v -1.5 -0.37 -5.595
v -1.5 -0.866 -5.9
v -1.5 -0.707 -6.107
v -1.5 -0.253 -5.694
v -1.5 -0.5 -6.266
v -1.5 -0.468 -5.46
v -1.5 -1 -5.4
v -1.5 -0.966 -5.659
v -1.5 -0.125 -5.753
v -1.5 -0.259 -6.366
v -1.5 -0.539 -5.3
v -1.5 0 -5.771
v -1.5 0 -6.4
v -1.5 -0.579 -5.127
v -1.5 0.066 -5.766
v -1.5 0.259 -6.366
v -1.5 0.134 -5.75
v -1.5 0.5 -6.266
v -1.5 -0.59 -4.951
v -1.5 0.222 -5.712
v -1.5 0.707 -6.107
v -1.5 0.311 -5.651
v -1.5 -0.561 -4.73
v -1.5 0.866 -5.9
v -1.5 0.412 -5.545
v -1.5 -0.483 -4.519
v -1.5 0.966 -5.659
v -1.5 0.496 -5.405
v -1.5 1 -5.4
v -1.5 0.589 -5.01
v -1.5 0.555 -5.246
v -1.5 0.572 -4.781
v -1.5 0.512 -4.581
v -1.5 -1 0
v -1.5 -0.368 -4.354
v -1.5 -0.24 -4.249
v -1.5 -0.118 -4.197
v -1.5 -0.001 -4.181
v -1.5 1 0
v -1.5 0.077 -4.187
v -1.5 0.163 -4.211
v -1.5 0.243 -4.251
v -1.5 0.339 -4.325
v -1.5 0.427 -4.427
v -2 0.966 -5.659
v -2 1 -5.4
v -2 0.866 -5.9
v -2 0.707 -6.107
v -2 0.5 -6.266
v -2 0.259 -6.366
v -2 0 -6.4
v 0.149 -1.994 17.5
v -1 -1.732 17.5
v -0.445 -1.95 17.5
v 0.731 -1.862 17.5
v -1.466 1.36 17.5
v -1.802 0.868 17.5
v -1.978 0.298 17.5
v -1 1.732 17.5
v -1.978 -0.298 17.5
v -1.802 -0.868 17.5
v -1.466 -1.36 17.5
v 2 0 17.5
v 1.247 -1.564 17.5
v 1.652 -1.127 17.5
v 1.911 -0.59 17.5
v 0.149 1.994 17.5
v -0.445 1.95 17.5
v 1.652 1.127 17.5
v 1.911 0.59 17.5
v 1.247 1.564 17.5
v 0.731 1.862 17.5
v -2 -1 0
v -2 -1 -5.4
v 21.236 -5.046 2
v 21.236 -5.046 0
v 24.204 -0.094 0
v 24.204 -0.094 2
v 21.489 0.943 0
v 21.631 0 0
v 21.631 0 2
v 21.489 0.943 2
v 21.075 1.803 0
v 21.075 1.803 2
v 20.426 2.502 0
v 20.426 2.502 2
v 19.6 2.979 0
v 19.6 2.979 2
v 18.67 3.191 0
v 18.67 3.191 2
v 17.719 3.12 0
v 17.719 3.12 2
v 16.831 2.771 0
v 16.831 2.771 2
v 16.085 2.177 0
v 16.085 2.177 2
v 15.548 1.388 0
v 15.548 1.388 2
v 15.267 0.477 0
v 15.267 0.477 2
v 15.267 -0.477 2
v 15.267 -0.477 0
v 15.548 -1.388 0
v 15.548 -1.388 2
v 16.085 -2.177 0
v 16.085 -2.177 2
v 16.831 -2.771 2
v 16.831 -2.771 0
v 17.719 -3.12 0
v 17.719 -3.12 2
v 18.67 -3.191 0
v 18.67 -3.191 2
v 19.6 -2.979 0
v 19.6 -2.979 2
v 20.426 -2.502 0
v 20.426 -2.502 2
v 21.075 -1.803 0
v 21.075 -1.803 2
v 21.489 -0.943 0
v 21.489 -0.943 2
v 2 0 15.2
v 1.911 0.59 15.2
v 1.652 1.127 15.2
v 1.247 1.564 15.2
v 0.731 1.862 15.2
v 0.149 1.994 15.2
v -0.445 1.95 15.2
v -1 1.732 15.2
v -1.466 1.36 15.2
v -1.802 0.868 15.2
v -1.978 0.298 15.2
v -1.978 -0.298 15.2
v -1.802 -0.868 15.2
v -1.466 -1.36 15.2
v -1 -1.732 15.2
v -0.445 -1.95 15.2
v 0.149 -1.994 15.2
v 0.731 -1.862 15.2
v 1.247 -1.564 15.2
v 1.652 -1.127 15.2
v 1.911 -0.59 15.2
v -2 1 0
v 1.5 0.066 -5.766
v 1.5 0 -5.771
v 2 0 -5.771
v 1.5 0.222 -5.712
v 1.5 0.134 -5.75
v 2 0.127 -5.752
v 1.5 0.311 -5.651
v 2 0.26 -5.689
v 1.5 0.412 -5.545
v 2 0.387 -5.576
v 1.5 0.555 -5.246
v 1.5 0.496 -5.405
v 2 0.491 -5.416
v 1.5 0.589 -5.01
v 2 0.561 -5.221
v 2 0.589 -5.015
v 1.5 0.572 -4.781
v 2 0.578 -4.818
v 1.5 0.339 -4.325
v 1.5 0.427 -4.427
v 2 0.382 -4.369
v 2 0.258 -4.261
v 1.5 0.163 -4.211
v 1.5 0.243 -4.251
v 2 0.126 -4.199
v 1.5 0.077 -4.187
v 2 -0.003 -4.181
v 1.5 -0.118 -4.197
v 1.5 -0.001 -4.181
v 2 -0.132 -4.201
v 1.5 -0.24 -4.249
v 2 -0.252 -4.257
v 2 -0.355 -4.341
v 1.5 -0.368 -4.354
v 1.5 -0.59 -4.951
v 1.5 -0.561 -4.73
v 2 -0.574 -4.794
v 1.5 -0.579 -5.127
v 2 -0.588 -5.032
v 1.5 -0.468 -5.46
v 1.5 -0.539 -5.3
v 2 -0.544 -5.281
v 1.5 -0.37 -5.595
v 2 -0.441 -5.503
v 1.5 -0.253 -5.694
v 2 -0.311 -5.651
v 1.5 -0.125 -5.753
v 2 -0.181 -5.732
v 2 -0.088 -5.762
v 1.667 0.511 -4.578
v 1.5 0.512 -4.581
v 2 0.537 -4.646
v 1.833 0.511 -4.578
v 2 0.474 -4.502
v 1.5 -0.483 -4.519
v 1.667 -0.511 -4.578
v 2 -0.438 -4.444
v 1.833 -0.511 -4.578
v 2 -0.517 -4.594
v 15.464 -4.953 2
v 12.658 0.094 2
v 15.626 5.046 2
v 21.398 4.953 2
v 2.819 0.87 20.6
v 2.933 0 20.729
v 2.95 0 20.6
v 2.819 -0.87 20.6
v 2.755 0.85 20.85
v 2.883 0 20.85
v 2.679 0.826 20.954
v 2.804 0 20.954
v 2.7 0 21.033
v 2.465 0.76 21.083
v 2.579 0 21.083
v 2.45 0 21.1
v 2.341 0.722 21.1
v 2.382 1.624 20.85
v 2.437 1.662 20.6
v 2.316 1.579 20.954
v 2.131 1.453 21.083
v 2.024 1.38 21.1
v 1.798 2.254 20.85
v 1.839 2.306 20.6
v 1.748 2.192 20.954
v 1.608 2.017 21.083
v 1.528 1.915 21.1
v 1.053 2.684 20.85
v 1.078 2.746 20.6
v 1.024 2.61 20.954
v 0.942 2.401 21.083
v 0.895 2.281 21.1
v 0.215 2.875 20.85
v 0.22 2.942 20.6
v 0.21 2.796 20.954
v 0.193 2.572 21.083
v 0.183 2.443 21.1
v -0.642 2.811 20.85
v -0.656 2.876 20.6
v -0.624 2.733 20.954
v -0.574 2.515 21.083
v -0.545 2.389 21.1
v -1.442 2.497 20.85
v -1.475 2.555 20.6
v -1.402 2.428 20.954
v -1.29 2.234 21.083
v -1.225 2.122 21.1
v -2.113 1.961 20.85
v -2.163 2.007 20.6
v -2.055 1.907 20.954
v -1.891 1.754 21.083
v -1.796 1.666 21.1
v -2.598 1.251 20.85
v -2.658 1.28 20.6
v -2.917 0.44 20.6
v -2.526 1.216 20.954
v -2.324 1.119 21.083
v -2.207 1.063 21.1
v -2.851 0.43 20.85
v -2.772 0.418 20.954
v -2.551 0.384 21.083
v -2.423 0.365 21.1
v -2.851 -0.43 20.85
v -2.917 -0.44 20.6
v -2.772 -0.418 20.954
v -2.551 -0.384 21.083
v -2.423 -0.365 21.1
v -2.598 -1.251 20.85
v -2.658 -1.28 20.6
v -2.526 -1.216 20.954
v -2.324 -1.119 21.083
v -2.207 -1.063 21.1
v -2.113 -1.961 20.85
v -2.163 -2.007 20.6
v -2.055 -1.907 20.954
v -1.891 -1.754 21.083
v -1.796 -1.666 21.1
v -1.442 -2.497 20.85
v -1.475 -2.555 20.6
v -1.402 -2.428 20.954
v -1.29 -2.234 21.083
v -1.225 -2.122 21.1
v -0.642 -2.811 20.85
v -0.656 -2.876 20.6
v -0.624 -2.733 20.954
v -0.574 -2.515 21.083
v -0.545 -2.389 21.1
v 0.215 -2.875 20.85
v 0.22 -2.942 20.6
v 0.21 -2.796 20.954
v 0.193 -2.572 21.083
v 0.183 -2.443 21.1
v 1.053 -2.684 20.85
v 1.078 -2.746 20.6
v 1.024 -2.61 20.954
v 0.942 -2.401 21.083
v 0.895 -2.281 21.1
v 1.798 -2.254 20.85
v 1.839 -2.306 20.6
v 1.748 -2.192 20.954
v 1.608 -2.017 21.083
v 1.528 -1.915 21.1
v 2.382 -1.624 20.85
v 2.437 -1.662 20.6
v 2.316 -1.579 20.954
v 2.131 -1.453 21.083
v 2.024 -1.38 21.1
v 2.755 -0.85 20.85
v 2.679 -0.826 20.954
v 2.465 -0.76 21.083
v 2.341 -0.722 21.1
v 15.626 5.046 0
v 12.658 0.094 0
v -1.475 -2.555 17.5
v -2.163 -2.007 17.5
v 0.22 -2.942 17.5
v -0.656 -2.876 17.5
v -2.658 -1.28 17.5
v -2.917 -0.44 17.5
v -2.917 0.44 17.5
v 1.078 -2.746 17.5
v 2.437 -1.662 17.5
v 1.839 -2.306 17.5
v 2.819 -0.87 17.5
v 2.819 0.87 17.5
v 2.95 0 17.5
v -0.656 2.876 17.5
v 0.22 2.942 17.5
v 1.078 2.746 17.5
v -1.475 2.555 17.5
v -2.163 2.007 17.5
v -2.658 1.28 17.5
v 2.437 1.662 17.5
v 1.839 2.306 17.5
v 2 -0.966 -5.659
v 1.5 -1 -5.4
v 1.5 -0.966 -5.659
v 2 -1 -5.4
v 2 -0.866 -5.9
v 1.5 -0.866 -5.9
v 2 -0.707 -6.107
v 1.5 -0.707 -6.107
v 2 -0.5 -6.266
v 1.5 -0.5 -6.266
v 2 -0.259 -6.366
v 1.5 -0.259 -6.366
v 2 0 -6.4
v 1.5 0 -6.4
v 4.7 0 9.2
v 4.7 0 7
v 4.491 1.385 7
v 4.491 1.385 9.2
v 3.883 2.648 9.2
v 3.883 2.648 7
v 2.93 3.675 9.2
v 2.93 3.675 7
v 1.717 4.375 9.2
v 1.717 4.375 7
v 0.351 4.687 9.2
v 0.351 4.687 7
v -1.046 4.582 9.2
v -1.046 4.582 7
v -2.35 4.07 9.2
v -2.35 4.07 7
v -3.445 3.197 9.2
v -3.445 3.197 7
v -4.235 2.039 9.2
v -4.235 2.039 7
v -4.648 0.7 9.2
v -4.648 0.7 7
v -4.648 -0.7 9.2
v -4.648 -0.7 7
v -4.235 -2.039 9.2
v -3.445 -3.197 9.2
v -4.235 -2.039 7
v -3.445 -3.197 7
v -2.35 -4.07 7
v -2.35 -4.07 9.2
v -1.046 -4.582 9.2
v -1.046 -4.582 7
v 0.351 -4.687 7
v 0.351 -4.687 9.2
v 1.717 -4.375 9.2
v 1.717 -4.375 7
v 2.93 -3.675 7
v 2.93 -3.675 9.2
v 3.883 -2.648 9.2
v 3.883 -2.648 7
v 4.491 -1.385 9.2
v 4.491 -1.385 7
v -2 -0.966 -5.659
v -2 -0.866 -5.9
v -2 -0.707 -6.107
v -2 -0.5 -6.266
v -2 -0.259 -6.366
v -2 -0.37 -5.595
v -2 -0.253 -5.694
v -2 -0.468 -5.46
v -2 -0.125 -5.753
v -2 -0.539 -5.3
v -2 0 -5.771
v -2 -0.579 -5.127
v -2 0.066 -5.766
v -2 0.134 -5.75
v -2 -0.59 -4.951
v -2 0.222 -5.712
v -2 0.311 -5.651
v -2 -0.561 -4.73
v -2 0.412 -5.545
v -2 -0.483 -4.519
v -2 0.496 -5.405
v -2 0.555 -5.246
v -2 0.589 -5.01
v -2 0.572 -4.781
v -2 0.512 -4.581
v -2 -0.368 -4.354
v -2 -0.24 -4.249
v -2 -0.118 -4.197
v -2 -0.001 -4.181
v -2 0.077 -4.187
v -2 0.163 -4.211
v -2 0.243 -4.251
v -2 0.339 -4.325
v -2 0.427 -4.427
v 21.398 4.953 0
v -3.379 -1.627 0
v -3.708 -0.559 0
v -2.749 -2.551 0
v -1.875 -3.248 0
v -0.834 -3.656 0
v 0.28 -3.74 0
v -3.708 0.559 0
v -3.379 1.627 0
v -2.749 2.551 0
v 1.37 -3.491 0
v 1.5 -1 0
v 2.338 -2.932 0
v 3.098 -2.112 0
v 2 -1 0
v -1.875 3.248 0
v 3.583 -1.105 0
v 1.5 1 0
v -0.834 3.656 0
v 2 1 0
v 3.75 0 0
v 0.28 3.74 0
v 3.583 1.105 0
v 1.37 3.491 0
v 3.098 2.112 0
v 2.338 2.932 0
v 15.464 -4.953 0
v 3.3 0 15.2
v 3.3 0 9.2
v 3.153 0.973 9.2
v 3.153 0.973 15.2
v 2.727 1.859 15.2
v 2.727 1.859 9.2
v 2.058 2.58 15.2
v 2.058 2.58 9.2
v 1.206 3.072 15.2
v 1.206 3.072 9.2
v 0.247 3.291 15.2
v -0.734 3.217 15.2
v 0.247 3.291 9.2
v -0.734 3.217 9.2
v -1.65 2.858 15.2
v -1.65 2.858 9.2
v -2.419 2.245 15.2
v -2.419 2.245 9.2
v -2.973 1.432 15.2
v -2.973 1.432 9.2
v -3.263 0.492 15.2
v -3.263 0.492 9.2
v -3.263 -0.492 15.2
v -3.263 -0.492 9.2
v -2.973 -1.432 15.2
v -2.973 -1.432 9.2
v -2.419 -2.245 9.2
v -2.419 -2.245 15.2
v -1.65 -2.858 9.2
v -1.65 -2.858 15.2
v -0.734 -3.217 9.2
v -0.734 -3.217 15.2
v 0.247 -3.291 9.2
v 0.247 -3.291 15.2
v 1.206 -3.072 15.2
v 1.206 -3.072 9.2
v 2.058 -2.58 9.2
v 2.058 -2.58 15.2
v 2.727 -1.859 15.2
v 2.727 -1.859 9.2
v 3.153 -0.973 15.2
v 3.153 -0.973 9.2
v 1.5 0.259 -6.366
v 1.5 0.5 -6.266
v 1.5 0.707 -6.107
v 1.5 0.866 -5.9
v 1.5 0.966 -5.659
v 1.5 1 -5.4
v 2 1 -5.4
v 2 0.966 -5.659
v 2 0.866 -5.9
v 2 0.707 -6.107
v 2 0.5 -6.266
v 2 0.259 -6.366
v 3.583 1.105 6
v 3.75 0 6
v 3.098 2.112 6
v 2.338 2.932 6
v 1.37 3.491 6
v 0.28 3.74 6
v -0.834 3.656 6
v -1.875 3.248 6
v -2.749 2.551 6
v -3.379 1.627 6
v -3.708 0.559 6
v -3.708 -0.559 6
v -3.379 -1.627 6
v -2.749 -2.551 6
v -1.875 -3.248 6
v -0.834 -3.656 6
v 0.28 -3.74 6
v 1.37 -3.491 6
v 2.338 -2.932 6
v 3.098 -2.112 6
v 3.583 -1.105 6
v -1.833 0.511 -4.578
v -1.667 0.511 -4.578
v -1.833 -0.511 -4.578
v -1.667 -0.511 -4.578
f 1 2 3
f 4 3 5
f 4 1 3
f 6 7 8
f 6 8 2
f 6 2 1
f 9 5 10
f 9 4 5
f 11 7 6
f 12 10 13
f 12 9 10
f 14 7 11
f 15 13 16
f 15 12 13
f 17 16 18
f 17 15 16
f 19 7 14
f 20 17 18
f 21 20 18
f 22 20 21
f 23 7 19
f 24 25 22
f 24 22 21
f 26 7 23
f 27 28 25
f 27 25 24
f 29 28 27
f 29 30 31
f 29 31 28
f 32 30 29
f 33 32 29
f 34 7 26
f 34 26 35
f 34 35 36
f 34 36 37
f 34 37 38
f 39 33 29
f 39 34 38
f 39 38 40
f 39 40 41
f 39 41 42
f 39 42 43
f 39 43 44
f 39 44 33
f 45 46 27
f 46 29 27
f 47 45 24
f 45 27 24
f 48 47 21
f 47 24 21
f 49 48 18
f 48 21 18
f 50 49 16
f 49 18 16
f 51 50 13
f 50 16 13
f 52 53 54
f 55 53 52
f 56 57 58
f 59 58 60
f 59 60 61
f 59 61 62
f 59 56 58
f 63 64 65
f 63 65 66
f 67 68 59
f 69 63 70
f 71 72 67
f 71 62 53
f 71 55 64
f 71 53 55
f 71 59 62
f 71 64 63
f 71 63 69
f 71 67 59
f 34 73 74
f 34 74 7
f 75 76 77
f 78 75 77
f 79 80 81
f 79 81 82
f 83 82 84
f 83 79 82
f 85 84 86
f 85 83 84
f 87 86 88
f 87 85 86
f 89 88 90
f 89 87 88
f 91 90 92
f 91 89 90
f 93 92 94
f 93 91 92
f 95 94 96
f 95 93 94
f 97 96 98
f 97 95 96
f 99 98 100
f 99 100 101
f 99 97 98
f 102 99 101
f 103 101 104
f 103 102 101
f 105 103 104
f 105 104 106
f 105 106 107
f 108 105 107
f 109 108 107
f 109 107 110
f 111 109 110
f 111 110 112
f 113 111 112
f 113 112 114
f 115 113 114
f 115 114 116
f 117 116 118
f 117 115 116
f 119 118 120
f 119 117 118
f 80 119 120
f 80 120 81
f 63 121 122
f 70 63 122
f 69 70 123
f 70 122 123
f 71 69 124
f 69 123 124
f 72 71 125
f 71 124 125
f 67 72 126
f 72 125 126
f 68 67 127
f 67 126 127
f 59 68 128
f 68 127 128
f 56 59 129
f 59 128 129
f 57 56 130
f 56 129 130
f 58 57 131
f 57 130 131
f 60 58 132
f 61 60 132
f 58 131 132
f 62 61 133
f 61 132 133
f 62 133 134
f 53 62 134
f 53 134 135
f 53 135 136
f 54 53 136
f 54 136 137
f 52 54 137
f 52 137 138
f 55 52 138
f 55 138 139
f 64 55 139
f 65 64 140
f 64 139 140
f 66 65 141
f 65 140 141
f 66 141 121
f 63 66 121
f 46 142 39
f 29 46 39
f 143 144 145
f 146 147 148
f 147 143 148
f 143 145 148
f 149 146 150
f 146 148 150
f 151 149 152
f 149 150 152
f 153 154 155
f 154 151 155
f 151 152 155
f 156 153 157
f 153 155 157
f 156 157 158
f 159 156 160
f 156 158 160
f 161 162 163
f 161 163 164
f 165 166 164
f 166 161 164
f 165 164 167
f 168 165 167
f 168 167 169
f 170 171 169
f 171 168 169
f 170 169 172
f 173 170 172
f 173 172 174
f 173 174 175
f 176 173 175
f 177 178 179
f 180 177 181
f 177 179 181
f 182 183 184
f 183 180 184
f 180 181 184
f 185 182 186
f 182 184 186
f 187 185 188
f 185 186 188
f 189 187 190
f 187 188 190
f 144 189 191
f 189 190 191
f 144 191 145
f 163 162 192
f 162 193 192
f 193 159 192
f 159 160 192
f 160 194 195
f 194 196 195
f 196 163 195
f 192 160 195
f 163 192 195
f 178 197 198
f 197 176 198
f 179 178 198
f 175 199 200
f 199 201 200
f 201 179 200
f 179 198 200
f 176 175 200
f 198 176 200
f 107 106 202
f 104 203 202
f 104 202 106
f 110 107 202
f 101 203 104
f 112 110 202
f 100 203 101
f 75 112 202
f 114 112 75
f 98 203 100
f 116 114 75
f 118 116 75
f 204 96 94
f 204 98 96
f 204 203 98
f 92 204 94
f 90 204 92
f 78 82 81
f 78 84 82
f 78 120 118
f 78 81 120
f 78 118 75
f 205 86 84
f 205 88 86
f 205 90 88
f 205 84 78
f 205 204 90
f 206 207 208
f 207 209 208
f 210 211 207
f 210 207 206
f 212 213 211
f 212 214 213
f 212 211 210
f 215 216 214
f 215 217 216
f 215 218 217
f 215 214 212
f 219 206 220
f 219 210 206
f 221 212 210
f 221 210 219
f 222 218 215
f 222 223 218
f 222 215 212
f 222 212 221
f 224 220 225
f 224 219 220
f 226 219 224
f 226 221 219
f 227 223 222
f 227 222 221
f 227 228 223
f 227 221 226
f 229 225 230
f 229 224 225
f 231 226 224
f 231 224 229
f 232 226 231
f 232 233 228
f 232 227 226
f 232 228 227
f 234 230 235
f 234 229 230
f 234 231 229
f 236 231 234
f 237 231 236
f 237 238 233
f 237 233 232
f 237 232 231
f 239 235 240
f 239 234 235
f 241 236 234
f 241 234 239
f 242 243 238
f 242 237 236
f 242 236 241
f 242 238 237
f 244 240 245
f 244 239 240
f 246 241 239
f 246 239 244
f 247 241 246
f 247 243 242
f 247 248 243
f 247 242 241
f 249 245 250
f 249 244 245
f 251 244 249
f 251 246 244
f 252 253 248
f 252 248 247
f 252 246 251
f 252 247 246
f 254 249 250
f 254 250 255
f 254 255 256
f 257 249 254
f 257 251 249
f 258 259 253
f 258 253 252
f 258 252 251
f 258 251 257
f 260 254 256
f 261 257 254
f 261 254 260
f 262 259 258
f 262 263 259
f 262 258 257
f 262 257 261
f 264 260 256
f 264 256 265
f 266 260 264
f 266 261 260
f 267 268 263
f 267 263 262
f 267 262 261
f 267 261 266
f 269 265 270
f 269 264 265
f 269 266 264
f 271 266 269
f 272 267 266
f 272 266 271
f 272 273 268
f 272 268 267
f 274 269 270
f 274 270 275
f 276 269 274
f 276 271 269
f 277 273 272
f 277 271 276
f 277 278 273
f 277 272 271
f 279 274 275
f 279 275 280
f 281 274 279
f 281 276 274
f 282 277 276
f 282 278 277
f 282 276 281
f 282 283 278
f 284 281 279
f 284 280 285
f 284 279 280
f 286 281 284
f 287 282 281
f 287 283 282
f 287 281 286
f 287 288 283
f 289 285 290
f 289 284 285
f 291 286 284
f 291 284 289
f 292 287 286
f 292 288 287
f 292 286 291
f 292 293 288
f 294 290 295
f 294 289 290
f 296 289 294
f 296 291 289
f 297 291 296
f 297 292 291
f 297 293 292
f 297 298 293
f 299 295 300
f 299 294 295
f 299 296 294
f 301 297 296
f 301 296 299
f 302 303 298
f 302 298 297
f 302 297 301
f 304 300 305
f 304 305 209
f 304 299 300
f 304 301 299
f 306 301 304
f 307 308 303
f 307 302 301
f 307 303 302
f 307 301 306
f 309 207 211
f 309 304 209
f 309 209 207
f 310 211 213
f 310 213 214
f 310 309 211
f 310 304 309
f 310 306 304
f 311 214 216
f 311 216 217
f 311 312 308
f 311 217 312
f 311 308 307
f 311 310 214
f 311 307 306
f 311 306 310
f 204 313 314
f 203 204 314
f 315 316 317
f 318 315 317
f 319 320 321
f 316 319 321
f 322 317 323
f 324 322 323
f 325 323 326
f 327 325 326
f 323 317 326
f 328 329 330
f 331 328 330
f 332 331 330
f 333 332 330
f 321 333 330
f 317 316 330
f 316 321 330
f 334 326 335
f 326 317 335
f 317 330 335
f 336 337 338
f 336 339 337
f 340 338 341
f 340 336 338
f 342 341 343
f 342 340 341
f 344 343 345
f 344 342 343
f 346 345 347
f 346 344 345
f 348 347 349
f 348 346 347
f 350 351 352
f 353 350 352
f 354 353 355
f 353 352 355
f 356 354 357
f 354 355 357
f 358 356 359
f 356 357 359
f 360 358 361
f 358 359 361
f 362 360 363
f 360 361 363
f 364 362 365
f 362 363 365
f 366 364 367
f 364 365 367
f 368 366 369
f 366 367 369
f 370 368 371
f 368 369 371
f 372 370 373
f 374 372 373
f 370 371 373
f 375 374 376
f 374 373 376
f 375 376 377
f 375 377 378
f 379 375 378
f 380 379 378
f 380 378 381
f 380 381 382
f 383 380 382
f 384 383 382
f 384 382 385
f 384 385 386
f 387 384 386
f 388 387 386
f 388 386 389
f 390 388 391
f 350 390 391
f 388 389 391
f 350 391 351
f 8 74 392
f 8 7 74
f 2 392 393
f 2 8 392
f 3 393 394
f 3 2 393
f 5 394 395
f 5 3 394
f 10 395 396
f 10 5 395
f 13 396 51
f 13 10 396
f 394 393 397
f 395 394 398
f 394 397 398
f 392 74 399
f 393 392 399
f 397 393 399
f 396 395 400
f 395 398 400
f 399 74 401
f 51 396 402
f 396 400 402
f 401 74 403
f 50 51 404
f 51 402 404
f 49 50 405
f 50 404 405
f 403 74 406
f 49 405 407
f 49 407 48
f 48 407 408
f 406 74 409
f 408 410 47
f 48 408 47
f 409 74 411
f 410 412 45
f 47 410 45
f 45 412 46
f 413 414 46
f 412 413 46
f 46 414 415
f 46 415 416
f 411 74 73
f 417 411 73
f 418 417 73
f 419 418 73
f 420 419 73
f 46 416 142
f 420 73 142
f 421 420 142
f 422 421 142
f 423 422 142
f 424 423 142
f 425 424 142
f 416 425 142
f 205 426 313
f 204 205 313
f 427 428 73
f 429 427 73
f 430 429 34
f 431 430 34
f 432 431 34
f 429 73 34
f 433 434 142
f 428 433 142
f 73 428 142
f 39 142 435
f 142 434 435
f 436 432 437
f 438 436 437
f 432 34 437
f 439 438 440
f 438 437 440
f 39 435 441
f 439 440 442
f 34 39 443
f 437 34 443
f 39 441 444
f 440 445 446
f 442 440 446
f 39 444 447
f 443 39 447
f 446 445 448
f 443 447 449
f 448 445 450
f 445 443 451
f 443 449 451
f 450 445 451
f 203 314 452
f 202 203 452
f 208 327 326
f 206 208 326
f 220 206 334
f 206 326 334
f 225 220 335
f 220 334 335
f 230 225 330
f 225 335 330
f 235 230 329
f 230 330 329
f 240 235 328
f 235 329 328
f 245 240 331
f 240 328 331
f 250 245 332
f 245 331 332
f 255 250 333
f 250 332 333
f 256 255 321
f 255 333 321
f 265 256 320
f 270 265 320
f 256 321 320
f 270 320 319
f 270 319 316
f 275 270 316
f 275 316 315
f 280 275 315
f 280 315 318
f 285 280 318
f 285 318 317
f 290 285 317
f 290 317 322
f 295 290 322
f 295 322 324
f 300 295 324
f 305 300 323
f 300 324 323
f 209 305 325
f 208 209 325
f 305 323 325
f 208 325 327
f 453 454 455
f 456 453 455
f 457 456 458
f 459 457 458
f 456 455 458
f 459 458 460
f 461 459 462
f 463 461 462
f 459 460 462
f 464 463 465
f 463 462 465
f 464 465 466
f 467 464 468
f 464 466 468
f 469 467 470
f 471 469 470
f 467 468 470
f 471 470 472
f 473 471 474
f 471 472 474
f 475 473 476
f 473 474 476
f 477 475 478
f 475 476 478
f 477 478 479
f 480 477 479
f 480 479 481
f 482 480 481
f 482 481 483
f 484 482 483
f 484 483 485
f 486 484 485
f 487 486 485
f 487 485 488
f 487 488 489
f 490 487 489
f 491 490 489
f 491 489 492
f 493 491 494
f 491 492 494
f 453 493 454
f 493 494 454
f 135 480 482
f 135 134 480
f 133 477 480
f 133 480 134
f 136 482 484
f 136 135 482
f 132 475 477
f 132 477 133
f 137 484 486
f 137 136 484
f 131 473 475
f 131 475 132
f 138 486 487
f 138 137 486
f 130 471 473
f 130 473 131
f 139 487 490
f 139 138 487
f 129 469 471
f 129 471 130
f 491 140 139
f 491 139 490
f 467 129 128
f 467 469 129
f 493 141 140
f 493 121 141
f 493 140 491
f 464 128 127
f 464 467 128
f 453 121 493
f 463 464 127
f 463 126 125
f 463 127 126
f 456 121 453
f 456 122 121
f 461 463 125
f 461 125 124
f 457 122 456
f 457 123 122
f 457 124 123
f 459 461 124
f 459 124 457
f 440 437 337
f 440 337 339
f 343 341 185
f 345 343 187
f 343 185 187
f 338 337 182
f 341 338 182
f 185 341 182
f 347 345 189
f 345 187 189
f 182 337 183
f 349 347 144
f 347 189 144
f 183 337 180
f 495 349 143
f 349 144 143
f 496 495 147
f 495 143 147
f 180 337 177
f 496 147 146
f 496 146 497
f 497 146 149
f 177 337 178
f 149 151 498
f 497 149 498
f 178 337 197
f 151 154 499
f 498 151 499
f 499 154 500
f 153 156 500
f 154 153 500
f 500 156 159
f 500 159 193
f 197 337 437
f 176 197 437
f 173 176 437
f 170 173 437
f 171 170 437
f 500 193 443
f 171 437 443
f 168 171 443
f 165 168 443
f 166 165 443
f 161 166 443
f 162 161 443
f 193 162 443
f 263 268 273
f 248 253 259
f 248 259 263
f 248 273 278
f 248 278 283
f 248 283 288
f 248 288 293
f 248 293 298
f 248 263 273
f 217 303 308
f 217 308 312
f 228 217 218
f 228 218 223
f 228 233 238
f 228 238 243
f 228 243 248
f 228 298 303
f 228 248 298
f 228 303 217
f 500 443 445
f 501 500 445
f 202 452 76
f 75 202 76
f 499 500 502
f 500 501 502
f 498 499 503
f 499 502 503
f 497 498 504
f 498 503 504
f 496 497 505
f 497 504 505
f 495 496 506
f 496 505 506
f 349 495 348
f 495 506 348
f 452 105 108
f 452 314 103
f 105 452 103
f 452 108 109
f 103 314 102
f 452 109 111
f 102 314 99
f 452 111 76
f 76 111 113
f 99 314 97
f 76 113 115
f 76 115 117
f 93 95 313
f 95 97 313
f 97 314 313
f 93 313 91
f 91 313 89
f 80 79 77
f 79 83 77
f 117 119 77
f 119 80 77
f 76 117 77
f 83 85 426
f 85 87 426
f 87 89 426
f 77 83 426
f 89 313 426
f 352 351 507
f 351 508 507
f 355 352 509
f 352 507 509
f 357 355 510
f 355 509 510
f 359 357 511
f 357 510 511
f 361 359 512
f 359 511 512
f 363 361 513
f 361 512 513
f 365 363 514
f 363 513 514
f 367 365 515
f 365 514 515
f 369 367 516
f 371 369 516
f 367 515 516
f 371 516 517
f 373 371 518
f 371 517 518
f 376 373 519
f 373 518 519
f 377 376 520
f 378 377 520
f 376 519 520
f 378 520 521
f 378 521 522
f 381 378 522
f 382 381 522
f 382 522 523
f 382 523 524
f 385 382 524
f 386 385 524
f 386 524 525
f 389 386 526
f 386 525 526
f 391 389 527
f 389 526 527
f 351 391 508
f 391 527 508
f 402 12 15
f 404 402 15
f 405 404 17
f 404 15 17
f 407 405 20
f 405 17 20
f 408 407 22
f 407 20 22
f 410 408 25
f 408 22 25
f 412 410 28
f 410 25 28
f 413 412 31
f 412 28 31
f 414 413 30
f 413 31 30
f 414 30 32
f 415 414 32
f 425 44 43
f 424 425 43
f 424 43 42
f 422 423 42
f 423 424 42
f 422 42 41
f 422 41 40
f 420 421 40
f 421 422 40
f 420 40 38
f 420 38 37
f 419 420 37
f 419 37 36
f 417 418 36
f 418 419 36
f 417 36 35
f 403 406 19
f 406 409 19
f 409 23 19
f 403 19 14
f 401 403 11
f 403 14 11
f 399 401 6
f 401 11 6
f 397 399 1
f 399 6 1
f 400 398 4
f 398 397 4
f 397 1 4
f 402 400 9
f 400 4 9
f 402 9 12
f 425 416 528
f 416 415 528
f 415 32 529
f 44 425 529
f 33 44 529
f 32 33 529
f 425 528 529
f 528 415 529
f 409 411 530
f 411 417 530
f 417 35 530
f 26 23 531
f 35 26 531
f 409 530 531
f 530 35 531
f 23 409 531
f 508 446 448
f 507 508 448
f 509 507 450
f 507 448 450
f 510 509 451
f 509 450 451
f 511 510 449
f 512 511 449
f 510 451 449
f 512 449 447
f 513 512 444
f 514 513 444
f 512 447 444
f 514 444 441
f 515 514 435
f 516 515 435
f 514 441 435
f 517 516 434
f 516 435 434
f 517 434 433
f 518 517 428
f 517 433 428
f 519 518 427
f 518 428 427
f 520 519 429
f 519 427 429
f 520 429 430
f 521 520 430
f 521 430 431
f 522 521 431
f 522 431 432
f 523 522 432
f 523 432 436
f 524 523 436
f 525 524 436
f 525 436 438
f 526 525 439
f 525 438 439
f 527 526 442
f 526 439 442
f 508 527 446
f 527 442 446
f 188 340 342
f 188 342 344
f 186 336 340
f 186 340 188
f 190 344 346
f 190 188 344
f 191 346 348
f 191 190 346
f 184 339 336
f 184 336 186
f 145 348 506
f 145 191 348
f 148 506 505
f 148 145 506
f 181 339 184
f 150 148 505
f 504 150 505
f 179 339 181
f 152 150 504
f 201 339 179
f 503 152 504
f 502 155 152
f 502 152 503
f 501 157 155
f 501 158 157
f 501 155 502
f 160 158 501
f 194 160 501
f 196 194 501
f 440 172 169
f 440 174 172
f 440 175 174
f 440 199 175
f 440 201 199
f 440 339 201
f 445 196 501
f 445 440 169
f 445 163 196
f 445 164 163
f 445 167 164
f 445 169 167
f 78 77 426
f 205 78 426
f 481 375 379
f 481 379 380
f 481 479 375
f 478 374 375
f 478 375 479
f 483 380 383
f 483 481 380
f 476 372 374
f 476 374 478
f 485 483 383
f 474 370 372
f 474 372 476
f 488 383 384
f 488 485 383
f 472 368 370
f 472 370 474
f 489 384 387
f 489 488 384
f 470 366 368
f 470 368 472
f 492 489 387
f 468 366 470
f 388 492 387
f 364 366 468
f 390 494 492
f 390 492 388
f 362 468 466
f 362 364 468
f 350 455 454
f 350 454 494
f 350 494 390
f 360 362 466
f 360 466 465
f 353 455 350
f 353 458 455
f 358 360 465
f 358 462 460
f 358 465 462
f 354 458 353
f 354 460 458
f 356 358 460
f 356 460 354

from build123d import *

# Parameters (mm, degrees)
F0_R      = 3.75
F0_W      = 0.5
F0_H      = 2
F1_DEPTH  = 6
F3_R      = 4.7
F1_FACE_R = 3.75
F5_DEPTH  = 2.2
F6_R      = 3.3
F7_DEPTH  = 6
F8_R      = 2
F9_DEPTH  = 2.3
F10_R     = 2.95
F11_DEPTH = 3.6
F12_R     = 0.5
F13_DEPTH = 6.4
F15_DEPTH = 6.7010001
F16_R     = 0.99999
F0_R_2    = 3.2
F17_DEPTH = 2


# Not quite as in the source:
# - a fillet or chamfer is up to 0.001 mm smaller than in the source, because OpenCascade refuses the exact size


with BuildPart() as f1:
    # F0 (on Top) → F1 (new body)
    with BuildSketch(Plane.XY):
        Circle(F0_R)
        with Locations((-1.75, 0)):
            Rectangle(F0_W, F0_H, mode=Mode.SUBTRACT)
        with Locations((1.75, 0)):
            Rectangle(F0_W, F0_H, mode=Mode.SUBTRACT)
        with Locations((-1.75, 0)):
            Rectangle(F0_W, F0_H)
        with Locations((1.75, 0)):
            Rectangle(F0_W, F0_H)
    extrude(amount=F1_DEPTH)

    # F3 (on offset) → F4 section 0
    with BuildSketch(Plane.XY.offset(7)):
        Circle(F3_R)
    # F1_face (on face) → F4 section 1
    with BuildSketch(Plane.XY.offset(6)):
        Circle(F1_FACE_R)
    loft()

    # F3 (on offset) → F5 (join)
    with BuildSketch(Plane.XY.offset(7)):
        Circle(F3_R)
    extrude(amount=F5_DEPTH)

    # F6 (on face) → F7 (join)
    with BuildSketch(Plane.XY.offset(9.2)):
        Circle(F6_R)
    extrude(amount=F7_DEPTH)

    # F8 (on face) → F9 (join)
    with BuildSketch(Plane.XY.offset(15.2)):
        Circle(F8_R)
    extrude(amount=F9_DEPTH)

    # F0 (on Top) → F13 (join)
    with BuildSketch(Plane.XY):
        with Locations((-1.75, 0)):
            Rectangle(F0_W, F0_H)
        with Locations((1.75, 0)):
            Rectangle(F0_W, F0_H)
    extrude(amount=-F13_DEPTH)

    # F14 (on face) → F15 (cut, through all)
    with BuildSketch(Plane.YZ.offset(2)):
        with BuildLine():
            add(Edge.make_bspline(
                [(0, -5.7707964443), (1.0216056149, -5.7707964443), (0.5108028075, -4.5781605877), (0, -3.3855247311), (-0.5108028075, -4.5781605877), (-1.0216056149, -5.7707964443), (0, -5.7707964443)],
                knots=[0, 0, 0, 2.0943951024, 2.0943951024, 4.1887902048, 4.1887902048, 6.2831853072, 6.2831853072, 6.2831853072], degree=2, weights=[1, 0.5, 1, 0.5, 1, 0.5, 1]))
        make_face()
    extrude(amount=-F15_DEPTH, mode=Mode.SUBTRACT)

    # F16 (radius 1 in the source; OpenCascade refuses exactly that, so slightly less here)
    f16_edges = [f1.edges().sort_by_distance(p)[0] for p in [
        (1.75, 1, -6.4),
        (1.75, -1, -6.4),
        (-1.75, 1, -6.4),
        (-1.75, -1, -6.4),
    ]]
    fillet(f16_edges, radius=F16_R)


with BuildPart() as f11:
    # F10 (on face) → F11 (new body)
    with BuildSketch(Plane.XY.offset(17.5)):
        Circle(F10_R)
    extrude(amount=F11_DEPTH)

    # F12
    f12_edges = [f11.edges().sort_by_distance(p)[0] for p in [
        (-2.95, 0, 21.1),
    ]]
    fillet(f12_edges, radius=F12_R)


with BuildPart() as f17:
    # F0 (on Top) → F17 (new body)
    with BuildSketch(Plane.XY):
        Polygon((24.2037526902, -0.0936588947), (21.3984921896, 4.9525126102), (15.6257492242, 5.0461715049), (12.6582667593, 0.0936588947), (15.4635272599, -4.9525126102), (21.2362702253, -5.0461715049), align=None)
        with Locations((18.4310097247, 0)):
            Circle(F0_R_2, mode=Mode.SUBTRACT)
    extrude(amount=F17_DEPTH)


solid = Compound([f1.part, f11.part, f17.part])
